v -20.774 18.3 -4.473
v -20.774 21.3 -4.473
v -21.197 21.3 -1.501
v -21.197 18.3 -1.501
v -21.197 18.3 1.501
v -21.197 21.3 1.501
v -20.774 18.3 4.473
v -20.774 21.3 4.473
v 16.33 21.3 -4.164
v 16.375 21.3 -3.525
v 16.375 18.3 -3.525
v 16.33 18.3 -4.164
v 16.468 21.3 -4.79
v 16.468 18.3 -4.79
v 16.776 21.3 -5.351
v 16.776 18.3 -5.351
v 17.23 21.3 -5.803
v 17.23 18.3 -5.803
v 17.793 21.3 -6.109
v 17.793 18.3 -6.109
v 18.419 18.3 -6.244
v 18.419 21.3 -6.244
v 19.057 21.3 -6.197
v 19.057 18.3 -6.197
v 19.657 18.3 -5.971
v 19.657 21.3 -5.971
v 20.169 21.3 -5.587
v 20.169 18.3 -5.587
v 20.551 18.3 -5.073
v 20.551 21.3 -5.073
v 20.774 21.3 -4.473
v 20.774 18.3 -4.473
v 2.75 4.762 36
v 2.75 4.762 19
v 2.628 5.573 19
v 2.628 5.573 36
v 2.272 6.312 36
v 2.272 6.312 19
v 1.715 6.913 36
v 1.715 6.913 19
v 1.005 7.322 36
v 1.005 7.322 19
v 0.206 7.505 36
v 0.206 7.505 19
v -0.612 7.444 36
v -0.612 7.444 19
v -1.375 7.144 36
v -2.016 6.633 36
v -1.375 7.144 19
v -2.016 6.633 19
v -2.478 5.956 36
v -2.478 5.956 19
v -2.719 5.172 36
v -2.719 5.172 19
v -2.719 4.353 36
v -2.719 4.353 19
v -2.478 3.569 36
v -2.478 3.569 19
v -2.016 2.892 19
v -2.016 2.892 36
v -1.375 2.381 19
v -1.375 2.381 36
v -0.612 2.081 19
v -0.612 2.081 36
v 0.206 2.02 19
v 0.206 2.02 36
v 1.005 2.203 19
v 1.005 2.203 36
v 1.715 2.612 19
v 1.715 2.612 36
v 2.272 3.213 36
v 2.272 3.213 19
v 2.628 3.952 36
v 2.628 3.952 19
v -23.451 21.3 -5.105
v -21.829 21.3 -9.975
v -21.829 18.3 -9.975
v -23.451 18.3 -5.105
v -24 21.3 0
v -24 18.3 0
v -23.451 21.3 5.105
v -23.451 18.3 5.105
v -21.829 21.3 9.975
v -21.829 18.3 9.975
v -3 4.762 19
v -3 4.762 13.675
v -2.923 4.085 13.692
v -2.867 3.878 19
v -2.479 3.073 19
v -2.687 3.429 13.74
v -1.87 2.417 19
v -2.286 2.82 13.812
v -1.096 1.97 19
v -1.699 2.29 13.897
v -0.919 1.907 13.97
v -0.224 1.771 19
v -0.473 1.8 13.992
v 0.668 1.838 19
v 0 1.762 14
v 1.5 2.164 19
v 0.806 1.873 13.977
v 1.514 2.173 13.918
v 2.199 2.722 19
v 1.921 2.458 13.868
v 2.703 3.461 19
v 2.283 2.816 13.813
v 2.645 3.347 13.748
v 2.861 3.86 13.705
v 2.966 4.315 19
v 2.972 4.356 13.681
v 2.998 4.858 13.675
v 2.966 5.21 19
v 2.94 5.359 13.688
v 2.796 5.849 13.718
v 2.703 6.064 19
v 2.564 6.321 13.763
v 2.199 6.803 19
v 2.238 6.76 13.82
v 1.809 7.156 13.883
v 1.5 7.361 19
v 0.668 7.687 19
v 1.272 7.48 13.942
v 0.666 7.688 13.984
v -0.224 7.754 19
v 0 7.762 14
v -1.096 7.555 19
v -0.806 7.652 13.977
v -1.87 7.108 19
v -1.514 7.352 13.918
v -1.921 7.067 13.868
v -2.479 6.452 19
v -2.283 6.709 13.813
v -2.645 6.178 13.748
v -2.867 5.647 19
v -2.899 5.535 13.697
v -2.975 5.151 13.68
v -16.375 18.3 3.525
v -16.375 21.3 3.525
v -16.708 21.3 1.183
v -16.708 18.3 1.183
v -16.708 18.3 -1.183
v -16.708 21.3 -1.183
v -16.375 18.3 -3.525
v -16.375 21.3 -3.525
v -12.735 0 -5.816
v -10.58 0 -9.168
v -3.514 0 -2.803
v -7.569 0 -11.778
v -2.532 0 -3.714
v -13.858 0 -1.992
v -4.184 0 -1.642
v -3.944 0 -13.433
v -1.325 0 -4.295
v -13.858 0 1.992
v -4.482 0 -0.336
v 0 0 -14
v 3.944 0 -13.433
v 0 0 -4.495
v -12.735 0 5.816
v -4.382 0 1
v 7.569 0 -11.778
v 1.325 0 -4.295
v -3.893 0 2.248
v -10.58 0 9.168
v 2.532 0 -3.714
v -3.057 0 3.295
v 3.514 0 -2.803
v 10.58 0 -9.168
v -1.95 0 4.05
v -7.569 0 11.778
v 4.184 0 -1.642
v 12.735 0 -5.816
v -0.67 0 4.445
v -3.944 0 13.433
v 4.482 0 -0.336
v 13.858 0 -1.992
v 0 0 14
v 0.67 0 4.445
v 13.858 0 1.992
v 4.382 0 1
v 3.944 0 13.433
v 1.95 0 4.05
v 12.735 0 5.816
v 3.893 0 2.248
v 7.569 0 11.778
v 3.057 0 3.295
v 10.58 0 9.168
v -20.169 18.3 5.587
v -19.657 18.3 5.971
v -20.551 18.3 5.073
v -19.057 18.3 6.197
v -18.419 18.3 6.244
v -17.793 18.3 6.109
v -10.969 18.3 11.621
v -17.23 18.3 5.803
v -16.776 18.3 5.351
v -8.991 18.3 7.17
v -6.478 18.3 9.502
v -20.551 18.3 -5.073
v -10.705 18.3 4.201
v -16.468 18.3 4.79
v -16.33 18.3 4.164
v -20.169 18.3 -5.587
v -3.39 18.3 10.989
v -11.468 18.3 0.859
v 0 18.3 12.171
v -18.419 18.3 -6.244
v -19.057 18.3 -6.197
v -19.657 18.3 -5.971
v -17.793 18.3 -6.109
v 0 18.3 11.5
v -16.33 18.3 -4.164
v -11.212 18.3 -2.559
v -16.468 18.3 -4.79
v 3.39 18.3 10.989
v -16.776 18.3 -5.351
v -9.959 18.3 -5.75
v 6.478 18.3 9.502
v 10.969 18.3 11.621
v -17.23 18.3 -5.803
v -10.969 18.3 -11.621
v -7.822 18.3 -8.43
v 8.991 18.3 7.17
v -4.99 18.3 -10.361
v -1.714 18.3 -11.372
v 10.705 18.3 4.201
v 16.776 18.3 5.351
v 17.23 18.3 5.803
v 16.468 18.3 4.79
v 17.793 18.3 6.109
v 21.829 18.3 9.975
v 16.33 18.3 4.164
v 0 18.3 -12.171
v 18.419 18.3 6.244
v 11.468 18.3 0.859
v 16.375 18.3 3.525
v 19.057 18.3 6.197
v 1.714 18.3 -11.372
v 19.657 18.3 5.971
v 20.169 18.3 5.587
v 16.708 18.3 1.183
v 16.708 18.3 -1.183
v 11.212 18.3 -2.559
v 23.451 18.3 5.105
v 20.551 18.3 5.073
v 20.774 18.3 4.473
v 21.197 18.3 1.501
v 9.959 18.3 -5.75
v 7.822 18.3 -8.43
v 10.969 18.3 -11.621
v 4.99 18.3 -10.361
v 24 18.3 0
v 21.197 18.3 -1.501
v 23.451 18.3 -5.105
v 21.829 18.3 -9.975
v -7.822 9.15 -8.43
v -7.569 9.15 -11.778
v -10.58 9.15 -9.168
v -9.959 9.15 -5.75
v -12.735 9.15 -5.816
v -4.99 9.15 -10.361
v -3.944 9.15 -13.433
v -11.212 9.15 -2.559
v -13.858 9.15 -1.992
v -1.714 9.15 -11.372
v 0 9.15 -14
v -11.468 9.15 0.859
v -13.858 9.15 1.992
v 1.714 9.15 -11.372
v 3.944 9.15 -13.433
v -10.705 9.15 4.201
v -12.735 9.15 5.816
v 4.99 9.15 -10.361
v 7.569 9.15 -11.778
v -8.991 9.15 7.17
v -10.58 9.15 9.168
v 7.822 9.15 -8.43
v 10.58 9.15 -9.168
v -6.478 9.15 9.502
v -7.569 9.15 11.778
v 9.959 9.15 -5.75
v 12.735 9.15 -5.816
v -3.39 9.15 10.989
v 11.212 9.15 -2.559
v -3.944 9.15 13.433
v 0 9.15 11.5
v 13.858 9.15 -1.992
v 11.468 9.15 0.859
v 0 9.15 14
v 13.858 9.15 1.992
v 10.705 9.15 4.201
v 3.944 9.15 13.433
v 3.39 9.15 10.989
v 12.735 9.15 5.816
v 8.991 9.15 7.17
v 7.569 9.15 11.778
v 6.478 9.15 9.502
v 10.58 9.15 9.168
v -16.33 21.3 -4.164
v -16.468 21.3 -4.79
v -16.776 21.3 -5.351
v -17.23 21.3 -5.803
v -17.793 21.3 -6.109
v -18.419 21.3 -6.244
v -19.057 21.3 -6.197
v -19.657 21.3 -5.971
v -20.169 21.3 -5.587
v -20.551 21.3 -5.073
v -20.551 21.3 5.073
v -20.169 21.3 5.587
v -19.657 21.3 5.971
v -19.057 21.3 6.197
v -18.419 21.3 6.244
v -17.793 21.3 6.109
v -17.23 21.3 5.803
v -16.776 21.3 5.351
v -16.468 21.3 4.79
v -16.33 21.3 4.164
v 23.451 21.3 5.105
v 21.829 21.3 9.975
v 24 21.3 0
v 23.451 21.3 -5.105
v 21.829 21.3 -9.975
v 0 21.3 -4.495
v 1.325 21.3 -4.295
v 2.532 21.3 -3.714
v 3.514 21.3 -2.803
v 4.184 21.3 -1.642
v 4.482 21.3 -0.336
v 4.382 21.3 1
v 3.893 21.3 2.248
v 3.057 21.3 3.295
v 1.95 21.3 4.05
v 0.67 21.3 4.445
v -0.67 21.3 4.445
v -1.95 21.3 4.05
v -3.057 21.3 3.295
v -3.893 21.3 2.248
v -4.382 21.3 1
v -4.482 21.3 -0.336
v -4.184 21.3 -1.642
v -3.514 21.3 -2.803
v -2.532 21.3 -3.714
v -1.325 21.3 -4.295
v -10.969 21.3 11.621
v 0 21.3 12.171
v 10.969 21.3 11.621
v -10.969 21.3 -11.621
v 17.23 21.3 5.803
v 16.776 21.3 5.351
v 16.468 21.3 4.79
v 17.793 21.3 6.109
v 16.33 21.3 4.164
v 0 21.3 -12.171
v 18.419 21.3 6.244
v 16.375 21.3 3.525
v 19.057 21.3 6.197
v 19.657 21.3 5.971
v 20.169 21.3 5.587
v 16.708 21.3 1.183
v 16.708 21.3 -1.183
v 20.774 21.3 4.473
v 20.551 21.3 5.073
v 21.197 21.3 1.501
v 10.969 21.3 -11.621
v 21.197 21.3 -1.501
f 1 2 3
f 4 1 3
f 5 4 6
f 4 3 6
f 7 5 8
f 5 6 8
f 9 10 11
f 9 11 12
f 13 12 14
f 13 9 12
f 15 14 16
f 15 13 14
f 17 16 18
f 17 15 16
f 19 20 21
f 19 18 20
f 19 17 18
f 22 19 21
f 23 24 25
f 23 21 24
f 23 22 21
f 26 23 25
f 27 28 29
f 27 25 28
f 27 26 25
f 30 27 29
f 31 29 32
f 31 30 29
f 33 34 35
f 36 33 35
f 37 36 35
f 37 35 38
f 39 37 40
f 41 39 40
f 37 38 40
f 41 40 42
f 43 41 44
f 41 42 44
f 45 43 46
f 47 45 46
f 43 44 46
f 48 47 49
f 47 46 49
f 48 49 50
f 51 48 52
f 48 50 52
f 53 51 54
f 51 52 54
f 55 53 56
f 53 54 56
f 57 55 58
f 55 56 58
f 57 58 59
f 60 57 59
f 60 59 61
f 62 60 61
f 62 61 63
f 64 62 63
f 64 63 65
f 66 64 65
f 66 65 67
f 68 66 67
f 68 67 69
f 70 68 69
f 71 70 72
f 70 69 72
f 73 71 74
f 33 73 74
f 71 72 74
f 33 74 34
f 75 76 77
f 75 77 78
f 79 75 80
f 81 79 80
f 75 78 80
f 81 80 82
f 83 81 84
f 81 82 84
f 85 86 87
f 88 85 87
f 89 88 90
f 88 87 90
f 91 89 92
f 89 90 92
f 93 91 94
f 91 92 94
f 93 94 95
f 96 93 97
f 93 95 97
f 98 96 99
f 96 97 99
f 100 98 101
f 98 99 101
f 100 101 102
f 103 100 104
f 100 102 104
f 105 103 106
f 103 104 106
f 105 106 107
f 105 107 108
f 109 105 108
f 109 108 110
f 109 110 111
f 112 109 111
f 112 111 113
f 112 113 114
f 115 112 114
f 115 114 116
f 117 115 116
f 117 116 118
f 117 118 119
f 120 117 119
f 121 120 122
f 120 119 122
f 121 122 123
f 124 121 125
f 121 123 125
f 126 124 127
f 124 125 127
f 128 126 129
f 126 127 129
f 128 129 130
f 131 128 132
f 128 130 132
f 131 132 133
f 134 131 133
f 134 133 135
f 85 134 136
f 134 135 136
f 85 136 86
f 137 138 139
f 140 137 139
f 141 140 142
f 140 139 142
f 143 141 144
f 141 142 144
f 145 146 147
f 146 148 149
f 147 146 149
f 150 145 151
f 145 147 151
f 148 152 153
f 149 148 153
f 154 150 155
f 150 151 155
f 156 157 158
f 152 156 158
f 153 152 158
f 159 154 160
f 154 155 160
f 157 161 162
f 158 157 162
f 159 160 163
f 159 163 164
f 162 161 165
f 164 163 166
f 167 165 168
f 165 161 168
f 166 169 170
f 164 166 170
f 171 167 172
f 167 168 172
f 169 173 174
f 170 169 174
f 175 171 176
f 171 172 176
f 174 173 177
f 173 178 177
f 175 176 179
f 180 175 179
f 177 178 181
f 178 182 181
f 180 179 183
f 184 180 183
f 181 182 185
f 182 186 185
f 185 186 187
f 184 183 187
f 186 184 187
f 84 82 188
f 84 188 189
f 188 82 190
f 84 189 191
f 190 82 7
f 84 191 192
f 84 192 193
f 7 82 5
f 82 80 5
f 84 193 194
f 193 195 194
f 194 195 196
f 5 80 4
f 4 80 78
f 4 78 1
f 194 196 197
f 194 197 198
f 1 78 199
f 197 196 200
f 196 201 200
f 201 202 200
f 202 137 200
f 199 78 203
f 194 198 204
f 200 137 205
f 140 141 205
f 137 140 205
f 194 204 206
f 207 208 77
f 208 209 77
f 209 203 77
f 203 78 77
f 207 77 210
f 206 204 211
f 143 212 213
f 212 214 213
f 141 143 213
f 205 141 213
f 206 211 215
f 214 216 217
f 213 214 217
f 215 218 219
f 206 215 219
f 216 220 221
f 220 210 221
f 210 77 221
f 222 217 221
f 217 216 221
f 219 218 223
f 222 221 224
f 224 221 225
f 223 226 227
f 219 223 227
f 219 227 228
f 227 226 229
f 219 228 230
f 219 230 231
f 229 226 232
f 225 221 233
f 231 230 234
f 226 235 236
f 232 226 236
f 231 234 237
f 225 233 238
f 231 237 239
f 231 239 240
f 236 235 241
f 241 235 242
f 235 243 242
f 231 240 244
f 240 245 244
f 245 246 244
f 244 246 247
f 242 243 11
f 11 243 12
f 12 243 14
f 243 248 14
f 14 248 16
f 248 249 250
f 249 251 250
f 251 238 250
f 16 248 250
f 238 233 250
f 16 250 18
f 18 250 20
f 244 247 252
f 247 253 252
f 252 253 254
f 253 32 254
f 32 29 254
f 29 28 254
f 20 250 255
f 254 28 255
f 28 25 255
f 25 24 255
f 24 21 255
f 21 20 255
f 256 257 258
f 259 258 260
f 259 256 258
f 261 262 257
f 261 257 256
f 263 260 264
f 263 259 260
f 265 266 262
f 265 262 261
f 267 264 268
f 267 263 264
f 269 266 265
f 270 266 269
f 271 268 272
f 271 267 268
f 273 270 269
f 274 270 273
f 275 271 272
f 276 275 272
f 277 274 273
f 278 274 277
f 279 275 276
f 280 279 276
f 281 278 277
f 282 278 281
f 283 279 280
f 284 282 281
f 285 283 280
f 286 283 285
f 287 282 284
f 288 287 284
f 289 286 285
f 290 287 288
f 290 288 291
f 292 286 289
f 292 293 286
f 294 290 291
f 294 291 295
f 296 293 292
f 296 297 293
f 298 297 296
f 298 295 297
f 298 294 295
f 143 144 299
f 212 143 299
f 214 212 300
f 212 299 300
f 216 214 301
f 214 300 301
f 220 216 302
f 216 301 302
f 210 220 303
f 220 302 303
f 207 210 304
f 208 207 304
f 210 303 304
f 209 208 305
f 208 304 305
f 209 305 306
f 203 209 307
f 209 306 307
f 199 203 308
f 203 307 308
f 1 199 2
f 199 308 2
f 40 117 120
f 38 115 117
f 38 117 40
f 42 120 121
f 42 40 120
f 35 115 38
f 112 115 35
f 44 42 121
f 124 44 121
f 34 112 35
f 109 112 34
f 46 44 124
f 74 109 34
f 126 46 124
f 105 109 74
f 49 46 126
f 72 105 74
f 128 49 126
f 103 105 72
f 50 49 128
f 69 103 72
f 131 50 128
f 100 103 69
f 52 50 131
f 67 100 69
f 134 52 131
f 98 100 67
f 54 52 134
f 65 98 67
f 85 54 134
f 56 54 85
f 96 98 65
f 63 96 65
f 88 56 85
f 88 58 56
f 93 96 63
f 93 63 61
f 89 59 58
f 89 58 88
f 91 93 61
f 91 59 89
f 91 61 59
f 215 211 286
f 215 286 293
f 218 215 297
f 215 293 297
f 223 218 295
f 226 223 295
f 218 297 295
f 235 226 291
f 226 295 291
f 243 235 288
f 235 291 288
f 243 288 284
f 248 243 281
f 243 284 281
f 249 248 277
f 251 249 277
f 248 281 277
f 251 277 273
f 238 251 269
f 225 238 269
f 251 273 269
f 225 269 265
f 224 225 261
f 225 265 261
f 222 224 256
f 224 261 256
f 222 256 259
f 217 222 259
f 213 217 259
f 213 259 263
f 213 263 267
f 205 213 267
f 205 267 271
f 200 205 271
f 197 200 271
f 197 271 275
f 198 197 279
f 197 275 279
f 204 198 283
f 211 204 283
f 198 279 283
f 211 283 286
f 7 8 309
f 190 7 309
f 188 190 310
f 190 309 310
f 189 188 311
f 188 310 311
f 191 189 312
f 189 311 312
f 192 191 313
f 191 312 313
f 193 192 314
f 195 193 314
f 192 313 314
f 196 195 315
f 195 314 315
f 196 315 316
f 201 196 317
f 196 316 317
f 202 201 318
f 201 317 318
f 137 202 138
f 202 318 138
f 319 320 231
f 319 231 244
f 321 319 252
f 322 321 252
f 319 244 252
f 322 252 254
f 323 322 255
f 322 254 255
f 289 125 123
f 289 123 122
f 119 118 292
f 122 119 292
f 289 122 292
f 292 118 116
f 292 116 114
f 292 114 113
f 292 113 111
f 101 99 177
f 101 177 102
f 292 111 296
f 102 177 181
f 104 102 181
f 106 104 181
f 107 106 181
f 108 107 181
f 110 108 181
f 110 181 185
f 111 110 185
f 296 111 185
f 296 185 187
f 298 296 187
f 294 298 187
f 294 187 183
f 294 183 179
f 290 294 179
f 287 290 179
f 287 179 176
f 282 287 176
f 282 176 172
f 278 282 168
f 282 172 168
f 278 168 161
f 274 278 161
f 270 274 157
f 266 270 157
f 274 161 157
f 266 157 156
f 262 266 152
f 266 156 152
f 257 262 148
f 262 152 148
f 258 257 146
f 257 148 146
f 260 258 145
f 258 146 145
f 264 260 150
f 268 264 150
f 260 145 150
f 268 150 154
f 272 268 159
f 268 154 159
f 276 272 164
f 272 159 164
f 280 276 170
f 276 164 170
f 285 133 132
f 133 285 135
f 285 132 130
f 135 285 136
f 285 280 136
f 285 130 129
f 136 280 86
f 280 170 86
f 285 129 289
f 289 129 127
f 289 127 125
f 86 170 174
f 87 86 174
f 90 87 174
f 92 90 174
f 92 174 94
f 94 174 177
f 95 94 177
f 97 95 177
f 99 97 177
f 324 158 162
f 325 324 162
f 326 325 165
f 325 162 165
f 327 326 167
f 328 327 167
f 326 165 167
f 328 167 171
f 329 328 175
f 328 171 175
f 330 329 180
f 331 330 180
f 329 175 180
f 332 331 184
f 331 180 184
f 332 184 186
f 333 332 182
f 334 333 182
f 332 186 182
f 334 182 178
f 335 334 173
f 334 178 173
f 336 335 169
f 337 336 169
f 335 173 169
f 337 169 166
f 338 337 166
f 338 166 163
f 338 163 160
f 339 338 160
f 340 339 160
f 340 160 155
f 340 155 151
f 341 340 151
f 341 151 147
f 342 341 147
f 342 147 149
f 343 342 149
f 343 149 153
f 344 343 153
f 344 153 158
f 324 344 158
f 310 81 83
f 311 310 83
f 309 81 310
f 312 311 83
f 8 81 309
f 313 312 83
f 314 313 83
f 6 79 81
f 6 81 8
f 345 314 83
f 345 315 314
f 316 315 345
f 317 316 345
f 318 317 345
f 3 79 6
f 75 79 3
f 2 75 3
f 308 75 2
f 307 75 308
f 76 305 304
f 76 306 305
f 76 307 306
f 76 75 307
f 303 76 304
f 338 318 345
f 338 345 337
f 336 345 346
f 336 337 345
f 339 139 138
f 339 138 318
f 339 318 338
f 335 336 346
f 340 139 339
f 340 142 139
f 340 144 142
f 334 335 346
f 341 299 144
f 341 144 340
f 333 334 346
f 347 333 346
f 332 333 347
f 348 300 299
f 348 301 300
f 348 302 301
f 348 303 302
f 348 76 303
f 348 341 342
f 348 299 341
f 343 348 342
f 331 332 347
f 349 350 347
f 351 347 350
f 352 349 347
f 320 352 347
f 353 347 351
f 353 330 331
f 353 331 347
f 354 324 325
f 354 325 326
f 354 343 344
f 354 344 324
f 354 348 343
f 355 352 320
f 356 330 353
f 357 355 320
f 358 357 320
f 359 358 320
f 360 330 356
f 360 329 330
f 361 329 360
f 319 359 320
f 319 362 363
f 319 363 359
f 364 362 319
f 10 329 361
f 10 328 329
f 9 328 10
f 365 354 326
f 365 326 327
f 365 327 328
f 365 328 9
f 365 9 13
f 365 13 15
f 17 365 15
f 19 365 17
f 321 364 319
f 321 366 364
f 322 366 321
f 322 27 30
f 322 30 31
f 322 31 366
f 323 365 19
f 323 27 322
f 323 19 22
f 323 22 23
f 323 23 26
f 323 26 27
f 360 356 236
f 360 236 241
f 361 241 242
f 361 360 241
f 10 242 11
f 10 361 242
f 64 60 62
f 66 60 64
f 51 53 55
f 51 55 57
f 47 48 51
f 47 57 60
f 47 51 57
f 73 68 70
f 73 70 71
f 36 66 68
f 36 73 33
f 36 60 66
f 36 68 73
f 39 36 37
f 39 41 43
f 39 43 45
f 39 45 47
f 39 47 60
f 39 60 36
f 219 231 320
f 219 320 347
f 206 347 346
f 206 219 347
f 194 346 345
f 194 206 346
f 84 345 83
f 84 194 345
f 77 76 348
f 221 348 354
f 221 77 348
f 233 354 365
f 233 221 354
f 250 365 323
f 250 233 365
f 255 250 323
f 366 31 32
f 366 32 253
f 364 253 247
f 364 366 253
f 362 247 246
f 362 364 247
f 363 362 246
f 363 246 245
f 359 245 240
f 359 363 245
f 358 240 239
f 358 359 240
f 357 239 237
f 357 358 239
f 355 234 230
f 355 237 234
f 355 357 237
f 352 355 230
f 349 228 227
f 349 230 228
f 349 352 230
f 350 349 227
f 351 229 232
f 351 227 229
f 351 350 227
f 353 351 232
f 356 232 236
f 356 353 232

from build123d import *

# Parameters (mm, degrees)
SKETCH1_R           = 14
BOSS_EXTRUDE1_DEPTH = 9.15
SKETCH2_R           = 11.5
BOSS_EXTRUDE2_DEPTH = 9.15
BOSS_EXTRUDE3_DEPTH = 3
CUT_EXTRUDE1_START  = -3.000001
CUT_EXTRUDE1_DEPTH  = 3.000002
CUT_EXTRUDE2_DEPTH  = 36.009855755
SKETCH7_R           = 3
BOSS_EXTRUDE4_DEPTH = 19
SKETCH8_R           = 2.75
BOSS_EXTRUDE5_DEPTH = 17
SKETCH9_R           = 4.495
CUT_EXTRUDE3_DEPTH  = 49.225408241


with BuildPart() as part:
    # Sketch1 → Boss-Extrude1 (new body)
    with BuildSketch(Plane(origin=(0, 0, 0), x_dir=(1, 0, 0), z_dir=(0, 1, 0))):
        with Locations(Location((0, 0, 0), (0, 0, 270))):
            Circle(SKETCH1_R)
    extrude(amount=BOSS_EXTRUDE1_DEPTH)

    # Sketch2 → Boss-Extrude2 (add)
    with BuildSketch(Plane(origin=(0, 9.15, 0), x_dir=(1, 0, 0), z_dir=(0, 1, 0))):
        with Locations(Location((0, 0, 0), (0, 0, 270))):
            Circle(SKETCH2_R)
    extrude(amount=BOSS_EXTRUDE2_DEPTH)

    # Sketch3 → Boss-Extrude3 (add)
    with BuildSketch(Plane(origin=(0, 18.3, 0), x_dir=(1, 0, 0), z_dir=(0, 1, 0))):
        with BuildLine():
            Line((-20.684849103, -12.171155146), (20.684849103, -12.171155146))
            ThreePointArc((20.684849103, -12.171155146), (24, 0), (20.684849103, 12.171155146))
            Line((20.684849103, 12.171155146), (-20.684849103, 12.171155146))
            ThreePointArc((-20.684849103, 12.171155146), (-24, 0), (-20.684849103, -12.171155146))
        make_face()
    extrude(amount=BOSS_EXTRUDE3_DEPTH)

    # Sketch4 → Cut-Extrude1 (cut)
    with BuildSketch(Plane(origin=(0, 21.3, 0), x_dir=(1, 0, 0), z_dir=(0, 1, 0)).offset(CUT_EXTRUDE1_START)):
        with BuildLine():
            Line((-21.82865512, -9.975460673), (-21.82865512, -23.828437081))
            Line((-21.82865512, -23.828437081), (21.82865512, -23.828437081))
            Line((21.82865512, -23.828437081), (21.82865512, -9.975460673))
            ThreePointArc((21.82865512, -9.975460673), (0, -12.171155146), (-21.82865512, -9.975460673))
        make_face()
        with BuildLine():
            Line((21.82865512, 9.975460673), (21.82865512, 24.795204082))
            Line((21.82865512, 24.795204082), (-21.82865512, 24.795204082))
            Line((-21.82865512, 24.795204082), (-21.82865512, 9.975460673))
            ThreePointArc((-21.82865512, 9.975460673), (0, 12.171155146), (21.82865512, 9.975460673))
        make_face()
    extrude(amount=CUT_EXTRUDE1_DEPTH, mode=Mode.SUBTRACT)

    # Sketch6 → Cut-Extrude2 (cut, through all)
    with BuildSketch(Plane(origin=(0, 21.3, 0), x_dir=(1, 0, 0), z_dir=(0, 1, 0))):
        with BuildLine():
            ThreePointArc((-20.773998678, 4.472524896), (-21.25, 0), (-20.773998678, -4.472524896))
            ThreePointArc((-20.773998678, -4.472524896), (-18.100837358, -6.198563297), (-16.374798958, -3.525401977))
            ThreePointArc((-16.374798958, -3.525401977), (-16.75, 0), (-16.374798958, 3.525401977))
            ThreePointArc((-16.374798958, 3.525401977), (-18.100837358, 6.198563297), (-20.773998678, 4.472524896))
        make_face()
    cut_extrude2 = extrude(amount=-CUT_EXTRUDE2_DEPTH, mode=Mode.SUBTRACT)

    # Mirror1: Cut-Extrude2 across plane
    add(cut_extrude2.mirror(Plane(origin=(0, 0, 0), x_dir=(0, 0, 1), z_dir=(1, 0, 0))), mode=Mode.SUBTRACT)

    # Sketch7 → Boss-Extrude4 (add)
    with BuildSketch(Plane.XY):
        with Locations(Location((0, 4.762483919, 0), (0, 0, 180))):
            Circle(SKETCH7_R)
    extrude(amount=BOSS_EXTRUDE4_DEPTH)

    # Sketch8 → Boss-Extrude5 (add)
    with BuildSketch(Plane.XY.offset(19)):
        with Locations((0, 4.762483919)):
            Circle(SKETCH8_R)
    extrude(amount=BOSS_EXTRUDE5_DEPTH)

    # Sketch9 → Cut-Extrude3 (cut, through all)
    with BuildSketch(Plane.XZ):
        with Locations(Location((0, 0, 0), (0, 0, 270))):
            Circle(SKETCH9_R)
    extrude(amount=-CUT_EXTRUDE3_DEPTH, mode=Mode.SUBTRACT)


solid = part.part
